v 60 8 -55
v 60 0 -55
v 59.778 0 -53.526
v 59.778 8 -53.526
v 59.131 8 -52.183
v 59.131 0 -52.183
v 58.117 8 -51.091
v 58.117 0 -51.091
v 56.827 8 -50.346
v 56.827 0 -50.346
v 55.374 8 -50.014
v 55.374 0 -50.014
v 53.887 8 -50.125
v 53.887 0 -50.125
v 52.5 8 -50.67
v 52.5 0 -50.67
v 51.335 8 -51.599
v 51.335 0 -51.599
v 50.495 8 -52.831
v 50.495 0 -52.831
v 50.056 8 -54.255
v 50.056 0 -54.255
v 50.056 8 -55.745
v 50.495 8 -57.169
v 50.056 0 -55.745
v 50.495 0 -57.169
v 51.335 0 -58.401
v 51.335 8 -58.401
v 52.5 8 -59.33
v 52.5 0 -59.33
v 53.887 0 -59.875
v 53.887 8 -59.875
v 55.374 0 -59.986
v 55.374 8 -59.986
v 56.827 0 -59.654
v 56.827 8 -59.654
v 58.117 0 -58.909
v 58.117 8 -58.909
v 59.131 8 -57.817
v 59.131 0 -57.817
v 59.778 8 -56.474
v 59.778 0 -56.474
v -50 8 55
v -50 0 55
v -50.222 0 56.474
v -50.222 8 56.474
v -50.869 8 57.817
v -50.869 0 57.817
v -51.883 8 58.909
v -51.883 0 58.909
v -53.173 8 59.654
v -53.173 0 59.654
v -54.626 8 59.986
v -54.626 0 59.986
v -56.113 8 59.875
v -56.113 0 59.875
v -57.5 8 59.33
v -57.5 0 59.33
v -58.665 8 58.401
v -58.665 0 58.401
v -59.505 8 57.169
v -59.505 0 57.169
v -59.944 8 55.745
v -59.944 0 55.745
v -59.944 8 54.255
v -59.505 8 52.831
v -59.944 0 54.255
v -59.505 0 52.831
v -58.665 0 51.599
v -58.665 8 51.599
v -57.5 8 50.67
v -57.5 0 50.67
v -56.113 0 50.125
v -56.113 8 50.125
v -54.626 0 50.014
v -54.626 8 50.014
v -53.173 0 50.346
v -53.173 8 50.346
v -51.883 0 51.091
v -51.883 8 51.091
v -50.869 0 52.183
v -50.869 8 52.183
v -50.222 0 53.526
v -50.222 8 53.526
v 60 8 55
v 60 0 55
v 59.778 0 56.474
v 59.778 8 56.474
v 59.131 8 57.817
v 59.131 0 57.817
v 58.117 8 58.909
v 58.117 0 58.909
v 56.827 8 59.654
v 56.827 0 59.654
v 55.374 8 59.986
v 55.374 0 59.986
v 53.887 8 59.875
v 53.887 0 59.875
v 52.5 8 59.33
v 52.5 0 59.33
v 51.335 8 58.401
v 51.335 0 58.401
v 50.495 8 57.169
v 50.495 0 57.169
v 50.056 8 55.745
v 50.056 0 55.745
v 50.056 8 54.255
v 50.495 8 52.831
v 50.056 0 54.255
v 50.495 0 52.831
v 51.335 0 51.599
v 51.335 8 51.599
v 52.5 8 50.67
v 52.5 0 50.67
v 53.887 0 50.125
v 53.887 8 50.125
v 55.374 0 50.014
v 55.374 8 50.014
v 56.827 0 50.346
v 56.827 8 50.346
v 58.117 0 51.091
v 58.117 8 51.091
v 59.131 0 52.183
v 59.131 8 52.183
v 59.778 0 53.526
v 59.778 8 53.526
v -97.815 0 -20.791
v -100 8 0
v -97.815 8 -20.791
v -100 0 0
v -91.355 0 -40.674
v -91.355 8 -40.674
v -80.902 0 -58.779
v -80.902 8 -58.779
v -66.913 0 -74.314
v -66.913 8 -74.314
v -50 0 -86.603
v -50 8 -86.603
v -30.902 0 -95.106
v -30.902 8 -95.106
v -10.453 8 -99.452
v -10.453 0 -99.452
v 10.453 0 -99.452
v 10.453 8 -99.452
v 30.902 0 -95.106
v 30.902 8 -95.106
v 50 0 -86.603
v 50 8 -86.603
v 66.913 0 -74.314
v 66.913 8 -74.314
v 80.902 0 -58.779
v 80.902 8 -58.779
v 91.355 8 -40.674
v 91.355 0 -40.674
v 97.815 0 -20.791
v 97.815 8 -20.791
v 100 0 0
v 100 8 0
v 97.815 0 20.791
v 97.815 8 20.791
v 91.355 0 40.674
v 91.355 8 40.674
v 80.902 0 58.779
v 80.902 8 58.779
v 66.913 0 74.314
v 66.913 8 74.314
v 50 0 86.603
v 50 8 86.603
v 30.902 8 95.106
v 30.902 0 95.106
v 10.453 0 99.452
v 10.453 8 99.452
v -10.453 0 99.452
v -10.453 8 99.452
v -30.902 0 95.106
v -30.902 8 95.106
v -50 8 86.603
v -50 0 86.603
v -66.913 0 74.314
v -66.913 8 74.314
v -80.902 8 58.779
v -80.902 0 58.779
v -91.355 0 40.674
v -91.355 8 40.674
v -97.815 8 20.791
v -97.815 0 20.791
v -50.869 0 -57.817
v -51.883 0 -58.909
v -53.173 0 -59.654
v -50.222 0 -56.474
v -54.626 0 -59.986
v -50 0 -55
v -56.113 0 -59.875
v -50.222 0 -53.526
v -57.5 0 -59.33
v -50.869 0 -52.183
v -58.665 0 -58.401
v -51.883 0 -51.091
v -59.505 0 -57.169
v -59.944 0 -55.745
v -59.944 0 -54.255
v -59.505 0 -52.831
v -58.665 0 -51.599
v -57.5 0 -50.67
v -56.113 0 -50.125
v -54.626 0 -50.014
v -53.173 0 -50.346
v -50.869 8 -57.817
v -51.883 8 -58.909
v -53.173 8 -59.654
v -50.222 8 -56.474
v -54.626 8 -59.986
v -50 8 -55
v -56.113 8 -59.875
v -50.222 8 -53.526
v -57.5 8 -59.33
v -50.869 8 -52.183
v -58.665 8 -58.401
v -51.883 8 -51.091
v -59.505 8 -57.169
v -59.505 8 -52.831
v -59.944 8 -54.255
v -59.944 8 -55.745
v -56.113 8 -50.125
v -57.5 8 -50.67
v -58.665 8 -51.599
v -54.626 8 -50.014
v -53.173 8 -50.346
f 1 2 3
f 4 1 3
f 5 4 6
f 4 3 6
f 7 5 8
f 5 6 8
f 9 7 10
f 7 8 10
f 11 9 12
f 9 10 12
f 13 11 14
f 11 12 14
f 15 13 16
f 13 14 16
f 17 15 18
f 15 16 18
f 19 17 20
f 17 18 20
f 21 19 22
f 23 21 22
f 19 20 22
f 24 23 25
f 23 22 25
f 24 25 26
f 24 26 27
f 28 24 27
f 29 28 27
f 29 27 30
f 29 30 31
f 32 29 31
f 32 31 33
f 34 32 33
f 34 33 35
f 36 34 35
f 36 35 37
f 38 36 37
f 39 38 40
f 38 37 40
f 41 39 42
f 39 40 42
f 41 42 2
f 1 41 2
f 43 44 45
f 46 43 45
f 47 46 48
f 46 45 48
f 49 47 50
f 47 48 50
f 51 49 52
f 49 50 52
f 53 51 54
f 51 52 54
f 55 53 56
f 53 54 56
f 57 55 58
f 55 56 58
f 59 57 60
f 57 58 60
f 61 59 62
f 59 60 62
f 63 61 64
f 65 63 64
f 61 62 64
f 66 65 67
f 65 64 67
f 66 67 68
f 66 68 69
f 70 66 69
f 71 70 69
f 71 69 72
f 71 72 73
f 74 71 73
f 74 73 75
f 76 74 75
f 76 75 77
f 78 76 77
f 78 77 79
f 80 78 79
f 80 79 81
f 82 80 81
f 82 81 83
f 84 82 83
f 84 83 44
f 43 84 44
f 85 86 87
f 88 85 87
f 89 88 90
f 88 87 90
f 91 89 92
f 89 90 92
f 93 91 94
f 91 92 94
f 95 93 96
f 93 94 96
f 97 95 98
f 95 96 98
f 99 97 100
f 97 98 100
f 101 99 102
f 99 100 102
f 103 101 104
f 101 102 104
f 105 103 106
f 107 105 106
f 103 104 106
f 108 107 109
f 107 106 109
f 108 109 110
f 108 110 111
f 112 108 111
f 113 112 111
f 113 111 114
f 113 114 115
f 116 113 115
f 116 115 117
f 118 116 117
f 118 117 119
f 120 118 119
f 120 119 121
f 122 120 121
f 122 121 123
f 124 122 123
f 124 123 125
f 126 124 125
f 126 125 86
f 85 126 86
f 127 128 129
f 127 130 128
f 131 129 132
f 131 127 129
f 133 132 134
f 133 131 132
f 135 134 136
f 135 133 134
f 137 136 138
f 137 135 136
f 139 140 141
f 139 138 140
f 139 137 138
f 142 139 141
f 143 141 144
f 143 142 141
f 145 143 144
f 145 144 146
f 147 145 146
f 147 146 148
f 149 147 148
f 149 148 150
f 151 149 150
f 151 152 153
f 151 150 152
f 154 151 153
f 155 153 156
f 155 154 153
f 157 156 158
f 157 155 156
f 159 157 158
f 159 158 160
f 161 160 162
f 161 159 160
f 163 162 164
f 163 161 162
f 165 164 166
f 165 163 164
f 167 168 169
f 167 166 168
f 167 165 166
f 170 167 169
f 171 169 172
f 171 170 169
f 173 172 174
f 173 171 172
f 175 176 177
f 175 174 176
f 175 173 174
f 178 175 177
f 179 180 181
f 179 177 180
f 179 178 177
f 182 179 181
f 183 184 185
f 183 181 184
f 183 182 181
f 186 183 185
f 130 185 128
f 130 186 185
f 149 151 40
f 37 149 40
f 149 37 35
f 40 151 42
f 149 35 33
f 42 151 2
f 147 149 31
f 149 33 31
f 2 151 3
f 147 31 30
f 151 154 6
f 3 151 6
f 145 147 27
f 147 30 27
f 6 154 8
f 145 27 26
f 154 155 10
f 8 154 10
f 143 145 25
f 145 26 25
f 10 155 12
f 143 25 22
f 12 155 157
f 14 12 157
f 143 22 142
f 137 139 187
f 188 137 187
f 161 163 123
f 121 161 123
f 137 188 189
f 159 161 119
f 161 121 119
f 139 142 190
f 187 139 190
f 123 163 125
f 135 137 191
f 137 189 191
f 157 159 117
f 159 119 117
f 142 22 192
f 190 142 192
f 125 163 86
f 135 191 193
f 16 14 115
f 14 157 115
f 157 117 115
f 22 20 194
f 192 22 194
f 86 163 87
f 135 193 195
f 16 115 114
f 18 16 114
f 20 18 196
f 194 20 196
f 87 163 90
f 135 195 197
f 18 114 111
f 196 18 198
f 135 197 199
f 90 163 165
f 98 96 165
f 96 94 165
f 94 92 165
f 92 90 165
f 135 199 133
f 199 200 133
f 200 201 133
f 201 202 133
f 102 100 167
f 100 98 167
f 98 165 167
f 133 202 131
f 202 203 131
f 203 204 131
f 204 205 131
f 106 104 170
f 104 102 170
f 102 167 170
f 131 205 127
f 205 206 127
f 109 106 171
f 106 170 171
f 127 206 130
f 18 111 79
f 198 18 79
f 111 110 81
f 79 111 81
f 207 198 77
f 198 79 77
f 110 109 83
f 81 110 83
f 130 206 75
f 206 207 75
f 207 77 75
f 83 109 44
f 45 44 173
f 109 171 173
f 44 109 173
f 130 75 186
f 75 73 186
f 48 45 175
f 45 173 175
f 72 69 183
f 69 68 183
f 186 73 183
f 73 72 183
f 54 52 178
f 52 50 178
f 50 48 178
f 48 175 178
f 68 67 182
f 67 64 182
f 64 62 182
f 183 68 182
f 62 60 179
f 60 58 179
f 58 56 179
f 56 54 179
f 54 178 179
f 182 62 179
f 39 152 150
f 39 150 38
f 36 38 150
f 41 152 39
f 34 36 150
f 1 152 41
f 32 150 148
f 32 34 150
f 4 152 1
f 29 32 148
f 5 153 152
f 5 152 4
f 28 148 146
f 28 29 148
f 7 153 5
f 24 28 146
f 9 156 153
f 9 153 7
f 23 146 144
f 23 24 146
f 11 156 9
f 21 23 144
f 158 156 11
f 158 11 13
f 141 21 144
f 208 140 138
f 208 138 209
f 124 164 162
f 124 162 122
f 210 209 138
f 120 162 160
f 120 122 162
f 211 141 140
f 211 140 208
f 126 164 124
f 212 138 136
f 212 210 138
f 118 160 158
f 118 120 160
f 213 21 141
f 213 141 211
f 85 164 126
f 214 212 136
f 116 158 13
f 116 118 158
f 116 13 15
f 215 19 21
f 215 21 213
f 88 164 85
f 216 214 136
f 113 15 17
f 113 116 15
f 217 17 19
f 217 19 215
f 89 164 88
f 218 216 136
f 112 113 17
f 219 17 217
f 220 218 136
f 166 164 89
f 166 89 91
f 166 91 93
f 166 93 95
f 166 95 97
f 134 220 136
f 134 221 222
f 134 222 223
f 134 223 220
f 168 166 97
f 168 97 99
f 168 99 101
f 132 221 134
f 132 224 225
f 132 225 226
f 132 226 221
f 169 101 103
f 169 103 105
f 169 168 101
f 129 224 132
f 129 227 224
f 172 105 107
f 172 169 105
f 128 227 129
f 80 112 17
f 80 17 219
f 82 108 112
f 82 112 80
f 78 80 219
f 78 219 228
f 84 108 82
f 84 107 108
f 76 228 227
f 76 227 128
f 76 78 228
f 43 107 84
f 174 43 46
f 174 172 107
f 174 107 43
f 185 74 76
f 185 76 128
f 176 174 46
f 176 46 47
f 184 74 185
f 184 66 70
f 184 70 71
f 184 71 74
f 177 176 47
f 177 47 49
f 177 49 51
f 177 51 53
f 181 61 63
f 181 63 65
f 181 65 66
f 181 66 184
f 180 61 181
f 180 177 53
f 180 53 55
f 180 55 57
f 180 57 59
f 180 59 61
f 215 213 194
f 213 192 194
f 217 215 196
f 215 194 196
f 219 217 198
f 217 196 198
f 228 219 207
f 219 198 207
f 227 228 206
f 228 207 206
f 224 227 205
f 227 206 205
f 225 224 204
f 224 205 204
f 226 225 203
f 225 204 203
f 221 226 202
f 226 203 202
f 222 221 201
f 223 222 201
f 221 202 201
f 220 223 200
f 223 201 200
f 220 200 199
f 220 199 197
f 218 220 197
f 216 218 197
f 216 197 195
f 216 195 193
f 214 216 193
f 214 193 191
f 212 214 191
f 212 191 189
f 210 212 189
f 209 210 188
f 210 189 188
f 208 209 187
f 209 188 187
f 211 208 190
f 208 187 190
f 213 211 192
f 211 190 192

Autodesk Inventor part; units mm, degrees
ref_plane "YZ Plane" through (0, 0, 0) normal (1, 0, 0) x (0, 1, 0)
ref_plane "XZ Plane" through (0, 0, 0) normal (0, 1, 0) x (-1, 0, 0)
ref_plane "XY Plane" through (0, 0, 0) normal (0, 0, 1) x (1, 0, 0)
sketch "Esquisse1" plane through (0, 0, 0) normal (0, 1, 0) x (-1, 0, 0)
  circle A0 centre (0, 0) radius 100
  line L0 (55, -55) -> (-55, -55)
  line L1 (-55, -55) -> (-55, 55)
  line L2 (-55, 55) -> (55, 55)
  line L3 (55, 55) -> (55, -55)
  line L4 (55, -55) -> (-55, 55) construction
  line L5 (-55, -55) -> (55, 55) construction
  circle A1 centre (-55, 55) radius 5
  circle A2 centre (55, 55) radius 5
  circle A3 centre (55, -55) radius 5
  circle A4 centre (-55, -55) radius 5
  dimension "d0" = 200
  dimension "d3" = 110
  dimension "d4" = 10
extrude "Extrusion1" add sketch "Esquisse1" along normal blind 8 contours A0 | A4 L1 L0 | A4 L1 A1 L2 A2 L3 A3 L0 | L0 L1 A4 | A3 L3 L0 | L0 L3 A3 | A1 L2 L1 | L1 L2 A1 | A2 L2 L3 | L3 L2 A2
sketch "Esquisse2" plane through (0, 0, 0) normal (0, -1, 0) x (1, 0, 0)
  line L0 (-55, -55) -> (55, -55)
  line L1 (55, -55) -> (55, 55)
  line L2 (55, 55) -> (-55, 55)
  line L3 (-55, 55) -> (-55, -55)
  line L4 (-55, -55) -> (55, 55) construction
  line L5 (55, -55) -> (-55, 55) construction
  circle A0 centre (-55, 55) radius 5
  circle A1 centre (55, 55) radius 5
  circle A2 centre (55, -55) radius 5
  circle A3 centre (-55, -55) radius 5
  point P0 (0, 0)
  dimension "d5" = 110
  dimension "d6" = 10
extrude "Extrusion2" cut sketch "Esquisse2" against normal blind 10 contours L3 A3 L0 | L0 A3 L3 | A2 L1 L0 | L0 L1 A2 | A0 L2 L3 | L3 L2 A0 | A1 L2 L1 | L1 L2 A1
properties part number "base" material "Bois (bouleau)"
